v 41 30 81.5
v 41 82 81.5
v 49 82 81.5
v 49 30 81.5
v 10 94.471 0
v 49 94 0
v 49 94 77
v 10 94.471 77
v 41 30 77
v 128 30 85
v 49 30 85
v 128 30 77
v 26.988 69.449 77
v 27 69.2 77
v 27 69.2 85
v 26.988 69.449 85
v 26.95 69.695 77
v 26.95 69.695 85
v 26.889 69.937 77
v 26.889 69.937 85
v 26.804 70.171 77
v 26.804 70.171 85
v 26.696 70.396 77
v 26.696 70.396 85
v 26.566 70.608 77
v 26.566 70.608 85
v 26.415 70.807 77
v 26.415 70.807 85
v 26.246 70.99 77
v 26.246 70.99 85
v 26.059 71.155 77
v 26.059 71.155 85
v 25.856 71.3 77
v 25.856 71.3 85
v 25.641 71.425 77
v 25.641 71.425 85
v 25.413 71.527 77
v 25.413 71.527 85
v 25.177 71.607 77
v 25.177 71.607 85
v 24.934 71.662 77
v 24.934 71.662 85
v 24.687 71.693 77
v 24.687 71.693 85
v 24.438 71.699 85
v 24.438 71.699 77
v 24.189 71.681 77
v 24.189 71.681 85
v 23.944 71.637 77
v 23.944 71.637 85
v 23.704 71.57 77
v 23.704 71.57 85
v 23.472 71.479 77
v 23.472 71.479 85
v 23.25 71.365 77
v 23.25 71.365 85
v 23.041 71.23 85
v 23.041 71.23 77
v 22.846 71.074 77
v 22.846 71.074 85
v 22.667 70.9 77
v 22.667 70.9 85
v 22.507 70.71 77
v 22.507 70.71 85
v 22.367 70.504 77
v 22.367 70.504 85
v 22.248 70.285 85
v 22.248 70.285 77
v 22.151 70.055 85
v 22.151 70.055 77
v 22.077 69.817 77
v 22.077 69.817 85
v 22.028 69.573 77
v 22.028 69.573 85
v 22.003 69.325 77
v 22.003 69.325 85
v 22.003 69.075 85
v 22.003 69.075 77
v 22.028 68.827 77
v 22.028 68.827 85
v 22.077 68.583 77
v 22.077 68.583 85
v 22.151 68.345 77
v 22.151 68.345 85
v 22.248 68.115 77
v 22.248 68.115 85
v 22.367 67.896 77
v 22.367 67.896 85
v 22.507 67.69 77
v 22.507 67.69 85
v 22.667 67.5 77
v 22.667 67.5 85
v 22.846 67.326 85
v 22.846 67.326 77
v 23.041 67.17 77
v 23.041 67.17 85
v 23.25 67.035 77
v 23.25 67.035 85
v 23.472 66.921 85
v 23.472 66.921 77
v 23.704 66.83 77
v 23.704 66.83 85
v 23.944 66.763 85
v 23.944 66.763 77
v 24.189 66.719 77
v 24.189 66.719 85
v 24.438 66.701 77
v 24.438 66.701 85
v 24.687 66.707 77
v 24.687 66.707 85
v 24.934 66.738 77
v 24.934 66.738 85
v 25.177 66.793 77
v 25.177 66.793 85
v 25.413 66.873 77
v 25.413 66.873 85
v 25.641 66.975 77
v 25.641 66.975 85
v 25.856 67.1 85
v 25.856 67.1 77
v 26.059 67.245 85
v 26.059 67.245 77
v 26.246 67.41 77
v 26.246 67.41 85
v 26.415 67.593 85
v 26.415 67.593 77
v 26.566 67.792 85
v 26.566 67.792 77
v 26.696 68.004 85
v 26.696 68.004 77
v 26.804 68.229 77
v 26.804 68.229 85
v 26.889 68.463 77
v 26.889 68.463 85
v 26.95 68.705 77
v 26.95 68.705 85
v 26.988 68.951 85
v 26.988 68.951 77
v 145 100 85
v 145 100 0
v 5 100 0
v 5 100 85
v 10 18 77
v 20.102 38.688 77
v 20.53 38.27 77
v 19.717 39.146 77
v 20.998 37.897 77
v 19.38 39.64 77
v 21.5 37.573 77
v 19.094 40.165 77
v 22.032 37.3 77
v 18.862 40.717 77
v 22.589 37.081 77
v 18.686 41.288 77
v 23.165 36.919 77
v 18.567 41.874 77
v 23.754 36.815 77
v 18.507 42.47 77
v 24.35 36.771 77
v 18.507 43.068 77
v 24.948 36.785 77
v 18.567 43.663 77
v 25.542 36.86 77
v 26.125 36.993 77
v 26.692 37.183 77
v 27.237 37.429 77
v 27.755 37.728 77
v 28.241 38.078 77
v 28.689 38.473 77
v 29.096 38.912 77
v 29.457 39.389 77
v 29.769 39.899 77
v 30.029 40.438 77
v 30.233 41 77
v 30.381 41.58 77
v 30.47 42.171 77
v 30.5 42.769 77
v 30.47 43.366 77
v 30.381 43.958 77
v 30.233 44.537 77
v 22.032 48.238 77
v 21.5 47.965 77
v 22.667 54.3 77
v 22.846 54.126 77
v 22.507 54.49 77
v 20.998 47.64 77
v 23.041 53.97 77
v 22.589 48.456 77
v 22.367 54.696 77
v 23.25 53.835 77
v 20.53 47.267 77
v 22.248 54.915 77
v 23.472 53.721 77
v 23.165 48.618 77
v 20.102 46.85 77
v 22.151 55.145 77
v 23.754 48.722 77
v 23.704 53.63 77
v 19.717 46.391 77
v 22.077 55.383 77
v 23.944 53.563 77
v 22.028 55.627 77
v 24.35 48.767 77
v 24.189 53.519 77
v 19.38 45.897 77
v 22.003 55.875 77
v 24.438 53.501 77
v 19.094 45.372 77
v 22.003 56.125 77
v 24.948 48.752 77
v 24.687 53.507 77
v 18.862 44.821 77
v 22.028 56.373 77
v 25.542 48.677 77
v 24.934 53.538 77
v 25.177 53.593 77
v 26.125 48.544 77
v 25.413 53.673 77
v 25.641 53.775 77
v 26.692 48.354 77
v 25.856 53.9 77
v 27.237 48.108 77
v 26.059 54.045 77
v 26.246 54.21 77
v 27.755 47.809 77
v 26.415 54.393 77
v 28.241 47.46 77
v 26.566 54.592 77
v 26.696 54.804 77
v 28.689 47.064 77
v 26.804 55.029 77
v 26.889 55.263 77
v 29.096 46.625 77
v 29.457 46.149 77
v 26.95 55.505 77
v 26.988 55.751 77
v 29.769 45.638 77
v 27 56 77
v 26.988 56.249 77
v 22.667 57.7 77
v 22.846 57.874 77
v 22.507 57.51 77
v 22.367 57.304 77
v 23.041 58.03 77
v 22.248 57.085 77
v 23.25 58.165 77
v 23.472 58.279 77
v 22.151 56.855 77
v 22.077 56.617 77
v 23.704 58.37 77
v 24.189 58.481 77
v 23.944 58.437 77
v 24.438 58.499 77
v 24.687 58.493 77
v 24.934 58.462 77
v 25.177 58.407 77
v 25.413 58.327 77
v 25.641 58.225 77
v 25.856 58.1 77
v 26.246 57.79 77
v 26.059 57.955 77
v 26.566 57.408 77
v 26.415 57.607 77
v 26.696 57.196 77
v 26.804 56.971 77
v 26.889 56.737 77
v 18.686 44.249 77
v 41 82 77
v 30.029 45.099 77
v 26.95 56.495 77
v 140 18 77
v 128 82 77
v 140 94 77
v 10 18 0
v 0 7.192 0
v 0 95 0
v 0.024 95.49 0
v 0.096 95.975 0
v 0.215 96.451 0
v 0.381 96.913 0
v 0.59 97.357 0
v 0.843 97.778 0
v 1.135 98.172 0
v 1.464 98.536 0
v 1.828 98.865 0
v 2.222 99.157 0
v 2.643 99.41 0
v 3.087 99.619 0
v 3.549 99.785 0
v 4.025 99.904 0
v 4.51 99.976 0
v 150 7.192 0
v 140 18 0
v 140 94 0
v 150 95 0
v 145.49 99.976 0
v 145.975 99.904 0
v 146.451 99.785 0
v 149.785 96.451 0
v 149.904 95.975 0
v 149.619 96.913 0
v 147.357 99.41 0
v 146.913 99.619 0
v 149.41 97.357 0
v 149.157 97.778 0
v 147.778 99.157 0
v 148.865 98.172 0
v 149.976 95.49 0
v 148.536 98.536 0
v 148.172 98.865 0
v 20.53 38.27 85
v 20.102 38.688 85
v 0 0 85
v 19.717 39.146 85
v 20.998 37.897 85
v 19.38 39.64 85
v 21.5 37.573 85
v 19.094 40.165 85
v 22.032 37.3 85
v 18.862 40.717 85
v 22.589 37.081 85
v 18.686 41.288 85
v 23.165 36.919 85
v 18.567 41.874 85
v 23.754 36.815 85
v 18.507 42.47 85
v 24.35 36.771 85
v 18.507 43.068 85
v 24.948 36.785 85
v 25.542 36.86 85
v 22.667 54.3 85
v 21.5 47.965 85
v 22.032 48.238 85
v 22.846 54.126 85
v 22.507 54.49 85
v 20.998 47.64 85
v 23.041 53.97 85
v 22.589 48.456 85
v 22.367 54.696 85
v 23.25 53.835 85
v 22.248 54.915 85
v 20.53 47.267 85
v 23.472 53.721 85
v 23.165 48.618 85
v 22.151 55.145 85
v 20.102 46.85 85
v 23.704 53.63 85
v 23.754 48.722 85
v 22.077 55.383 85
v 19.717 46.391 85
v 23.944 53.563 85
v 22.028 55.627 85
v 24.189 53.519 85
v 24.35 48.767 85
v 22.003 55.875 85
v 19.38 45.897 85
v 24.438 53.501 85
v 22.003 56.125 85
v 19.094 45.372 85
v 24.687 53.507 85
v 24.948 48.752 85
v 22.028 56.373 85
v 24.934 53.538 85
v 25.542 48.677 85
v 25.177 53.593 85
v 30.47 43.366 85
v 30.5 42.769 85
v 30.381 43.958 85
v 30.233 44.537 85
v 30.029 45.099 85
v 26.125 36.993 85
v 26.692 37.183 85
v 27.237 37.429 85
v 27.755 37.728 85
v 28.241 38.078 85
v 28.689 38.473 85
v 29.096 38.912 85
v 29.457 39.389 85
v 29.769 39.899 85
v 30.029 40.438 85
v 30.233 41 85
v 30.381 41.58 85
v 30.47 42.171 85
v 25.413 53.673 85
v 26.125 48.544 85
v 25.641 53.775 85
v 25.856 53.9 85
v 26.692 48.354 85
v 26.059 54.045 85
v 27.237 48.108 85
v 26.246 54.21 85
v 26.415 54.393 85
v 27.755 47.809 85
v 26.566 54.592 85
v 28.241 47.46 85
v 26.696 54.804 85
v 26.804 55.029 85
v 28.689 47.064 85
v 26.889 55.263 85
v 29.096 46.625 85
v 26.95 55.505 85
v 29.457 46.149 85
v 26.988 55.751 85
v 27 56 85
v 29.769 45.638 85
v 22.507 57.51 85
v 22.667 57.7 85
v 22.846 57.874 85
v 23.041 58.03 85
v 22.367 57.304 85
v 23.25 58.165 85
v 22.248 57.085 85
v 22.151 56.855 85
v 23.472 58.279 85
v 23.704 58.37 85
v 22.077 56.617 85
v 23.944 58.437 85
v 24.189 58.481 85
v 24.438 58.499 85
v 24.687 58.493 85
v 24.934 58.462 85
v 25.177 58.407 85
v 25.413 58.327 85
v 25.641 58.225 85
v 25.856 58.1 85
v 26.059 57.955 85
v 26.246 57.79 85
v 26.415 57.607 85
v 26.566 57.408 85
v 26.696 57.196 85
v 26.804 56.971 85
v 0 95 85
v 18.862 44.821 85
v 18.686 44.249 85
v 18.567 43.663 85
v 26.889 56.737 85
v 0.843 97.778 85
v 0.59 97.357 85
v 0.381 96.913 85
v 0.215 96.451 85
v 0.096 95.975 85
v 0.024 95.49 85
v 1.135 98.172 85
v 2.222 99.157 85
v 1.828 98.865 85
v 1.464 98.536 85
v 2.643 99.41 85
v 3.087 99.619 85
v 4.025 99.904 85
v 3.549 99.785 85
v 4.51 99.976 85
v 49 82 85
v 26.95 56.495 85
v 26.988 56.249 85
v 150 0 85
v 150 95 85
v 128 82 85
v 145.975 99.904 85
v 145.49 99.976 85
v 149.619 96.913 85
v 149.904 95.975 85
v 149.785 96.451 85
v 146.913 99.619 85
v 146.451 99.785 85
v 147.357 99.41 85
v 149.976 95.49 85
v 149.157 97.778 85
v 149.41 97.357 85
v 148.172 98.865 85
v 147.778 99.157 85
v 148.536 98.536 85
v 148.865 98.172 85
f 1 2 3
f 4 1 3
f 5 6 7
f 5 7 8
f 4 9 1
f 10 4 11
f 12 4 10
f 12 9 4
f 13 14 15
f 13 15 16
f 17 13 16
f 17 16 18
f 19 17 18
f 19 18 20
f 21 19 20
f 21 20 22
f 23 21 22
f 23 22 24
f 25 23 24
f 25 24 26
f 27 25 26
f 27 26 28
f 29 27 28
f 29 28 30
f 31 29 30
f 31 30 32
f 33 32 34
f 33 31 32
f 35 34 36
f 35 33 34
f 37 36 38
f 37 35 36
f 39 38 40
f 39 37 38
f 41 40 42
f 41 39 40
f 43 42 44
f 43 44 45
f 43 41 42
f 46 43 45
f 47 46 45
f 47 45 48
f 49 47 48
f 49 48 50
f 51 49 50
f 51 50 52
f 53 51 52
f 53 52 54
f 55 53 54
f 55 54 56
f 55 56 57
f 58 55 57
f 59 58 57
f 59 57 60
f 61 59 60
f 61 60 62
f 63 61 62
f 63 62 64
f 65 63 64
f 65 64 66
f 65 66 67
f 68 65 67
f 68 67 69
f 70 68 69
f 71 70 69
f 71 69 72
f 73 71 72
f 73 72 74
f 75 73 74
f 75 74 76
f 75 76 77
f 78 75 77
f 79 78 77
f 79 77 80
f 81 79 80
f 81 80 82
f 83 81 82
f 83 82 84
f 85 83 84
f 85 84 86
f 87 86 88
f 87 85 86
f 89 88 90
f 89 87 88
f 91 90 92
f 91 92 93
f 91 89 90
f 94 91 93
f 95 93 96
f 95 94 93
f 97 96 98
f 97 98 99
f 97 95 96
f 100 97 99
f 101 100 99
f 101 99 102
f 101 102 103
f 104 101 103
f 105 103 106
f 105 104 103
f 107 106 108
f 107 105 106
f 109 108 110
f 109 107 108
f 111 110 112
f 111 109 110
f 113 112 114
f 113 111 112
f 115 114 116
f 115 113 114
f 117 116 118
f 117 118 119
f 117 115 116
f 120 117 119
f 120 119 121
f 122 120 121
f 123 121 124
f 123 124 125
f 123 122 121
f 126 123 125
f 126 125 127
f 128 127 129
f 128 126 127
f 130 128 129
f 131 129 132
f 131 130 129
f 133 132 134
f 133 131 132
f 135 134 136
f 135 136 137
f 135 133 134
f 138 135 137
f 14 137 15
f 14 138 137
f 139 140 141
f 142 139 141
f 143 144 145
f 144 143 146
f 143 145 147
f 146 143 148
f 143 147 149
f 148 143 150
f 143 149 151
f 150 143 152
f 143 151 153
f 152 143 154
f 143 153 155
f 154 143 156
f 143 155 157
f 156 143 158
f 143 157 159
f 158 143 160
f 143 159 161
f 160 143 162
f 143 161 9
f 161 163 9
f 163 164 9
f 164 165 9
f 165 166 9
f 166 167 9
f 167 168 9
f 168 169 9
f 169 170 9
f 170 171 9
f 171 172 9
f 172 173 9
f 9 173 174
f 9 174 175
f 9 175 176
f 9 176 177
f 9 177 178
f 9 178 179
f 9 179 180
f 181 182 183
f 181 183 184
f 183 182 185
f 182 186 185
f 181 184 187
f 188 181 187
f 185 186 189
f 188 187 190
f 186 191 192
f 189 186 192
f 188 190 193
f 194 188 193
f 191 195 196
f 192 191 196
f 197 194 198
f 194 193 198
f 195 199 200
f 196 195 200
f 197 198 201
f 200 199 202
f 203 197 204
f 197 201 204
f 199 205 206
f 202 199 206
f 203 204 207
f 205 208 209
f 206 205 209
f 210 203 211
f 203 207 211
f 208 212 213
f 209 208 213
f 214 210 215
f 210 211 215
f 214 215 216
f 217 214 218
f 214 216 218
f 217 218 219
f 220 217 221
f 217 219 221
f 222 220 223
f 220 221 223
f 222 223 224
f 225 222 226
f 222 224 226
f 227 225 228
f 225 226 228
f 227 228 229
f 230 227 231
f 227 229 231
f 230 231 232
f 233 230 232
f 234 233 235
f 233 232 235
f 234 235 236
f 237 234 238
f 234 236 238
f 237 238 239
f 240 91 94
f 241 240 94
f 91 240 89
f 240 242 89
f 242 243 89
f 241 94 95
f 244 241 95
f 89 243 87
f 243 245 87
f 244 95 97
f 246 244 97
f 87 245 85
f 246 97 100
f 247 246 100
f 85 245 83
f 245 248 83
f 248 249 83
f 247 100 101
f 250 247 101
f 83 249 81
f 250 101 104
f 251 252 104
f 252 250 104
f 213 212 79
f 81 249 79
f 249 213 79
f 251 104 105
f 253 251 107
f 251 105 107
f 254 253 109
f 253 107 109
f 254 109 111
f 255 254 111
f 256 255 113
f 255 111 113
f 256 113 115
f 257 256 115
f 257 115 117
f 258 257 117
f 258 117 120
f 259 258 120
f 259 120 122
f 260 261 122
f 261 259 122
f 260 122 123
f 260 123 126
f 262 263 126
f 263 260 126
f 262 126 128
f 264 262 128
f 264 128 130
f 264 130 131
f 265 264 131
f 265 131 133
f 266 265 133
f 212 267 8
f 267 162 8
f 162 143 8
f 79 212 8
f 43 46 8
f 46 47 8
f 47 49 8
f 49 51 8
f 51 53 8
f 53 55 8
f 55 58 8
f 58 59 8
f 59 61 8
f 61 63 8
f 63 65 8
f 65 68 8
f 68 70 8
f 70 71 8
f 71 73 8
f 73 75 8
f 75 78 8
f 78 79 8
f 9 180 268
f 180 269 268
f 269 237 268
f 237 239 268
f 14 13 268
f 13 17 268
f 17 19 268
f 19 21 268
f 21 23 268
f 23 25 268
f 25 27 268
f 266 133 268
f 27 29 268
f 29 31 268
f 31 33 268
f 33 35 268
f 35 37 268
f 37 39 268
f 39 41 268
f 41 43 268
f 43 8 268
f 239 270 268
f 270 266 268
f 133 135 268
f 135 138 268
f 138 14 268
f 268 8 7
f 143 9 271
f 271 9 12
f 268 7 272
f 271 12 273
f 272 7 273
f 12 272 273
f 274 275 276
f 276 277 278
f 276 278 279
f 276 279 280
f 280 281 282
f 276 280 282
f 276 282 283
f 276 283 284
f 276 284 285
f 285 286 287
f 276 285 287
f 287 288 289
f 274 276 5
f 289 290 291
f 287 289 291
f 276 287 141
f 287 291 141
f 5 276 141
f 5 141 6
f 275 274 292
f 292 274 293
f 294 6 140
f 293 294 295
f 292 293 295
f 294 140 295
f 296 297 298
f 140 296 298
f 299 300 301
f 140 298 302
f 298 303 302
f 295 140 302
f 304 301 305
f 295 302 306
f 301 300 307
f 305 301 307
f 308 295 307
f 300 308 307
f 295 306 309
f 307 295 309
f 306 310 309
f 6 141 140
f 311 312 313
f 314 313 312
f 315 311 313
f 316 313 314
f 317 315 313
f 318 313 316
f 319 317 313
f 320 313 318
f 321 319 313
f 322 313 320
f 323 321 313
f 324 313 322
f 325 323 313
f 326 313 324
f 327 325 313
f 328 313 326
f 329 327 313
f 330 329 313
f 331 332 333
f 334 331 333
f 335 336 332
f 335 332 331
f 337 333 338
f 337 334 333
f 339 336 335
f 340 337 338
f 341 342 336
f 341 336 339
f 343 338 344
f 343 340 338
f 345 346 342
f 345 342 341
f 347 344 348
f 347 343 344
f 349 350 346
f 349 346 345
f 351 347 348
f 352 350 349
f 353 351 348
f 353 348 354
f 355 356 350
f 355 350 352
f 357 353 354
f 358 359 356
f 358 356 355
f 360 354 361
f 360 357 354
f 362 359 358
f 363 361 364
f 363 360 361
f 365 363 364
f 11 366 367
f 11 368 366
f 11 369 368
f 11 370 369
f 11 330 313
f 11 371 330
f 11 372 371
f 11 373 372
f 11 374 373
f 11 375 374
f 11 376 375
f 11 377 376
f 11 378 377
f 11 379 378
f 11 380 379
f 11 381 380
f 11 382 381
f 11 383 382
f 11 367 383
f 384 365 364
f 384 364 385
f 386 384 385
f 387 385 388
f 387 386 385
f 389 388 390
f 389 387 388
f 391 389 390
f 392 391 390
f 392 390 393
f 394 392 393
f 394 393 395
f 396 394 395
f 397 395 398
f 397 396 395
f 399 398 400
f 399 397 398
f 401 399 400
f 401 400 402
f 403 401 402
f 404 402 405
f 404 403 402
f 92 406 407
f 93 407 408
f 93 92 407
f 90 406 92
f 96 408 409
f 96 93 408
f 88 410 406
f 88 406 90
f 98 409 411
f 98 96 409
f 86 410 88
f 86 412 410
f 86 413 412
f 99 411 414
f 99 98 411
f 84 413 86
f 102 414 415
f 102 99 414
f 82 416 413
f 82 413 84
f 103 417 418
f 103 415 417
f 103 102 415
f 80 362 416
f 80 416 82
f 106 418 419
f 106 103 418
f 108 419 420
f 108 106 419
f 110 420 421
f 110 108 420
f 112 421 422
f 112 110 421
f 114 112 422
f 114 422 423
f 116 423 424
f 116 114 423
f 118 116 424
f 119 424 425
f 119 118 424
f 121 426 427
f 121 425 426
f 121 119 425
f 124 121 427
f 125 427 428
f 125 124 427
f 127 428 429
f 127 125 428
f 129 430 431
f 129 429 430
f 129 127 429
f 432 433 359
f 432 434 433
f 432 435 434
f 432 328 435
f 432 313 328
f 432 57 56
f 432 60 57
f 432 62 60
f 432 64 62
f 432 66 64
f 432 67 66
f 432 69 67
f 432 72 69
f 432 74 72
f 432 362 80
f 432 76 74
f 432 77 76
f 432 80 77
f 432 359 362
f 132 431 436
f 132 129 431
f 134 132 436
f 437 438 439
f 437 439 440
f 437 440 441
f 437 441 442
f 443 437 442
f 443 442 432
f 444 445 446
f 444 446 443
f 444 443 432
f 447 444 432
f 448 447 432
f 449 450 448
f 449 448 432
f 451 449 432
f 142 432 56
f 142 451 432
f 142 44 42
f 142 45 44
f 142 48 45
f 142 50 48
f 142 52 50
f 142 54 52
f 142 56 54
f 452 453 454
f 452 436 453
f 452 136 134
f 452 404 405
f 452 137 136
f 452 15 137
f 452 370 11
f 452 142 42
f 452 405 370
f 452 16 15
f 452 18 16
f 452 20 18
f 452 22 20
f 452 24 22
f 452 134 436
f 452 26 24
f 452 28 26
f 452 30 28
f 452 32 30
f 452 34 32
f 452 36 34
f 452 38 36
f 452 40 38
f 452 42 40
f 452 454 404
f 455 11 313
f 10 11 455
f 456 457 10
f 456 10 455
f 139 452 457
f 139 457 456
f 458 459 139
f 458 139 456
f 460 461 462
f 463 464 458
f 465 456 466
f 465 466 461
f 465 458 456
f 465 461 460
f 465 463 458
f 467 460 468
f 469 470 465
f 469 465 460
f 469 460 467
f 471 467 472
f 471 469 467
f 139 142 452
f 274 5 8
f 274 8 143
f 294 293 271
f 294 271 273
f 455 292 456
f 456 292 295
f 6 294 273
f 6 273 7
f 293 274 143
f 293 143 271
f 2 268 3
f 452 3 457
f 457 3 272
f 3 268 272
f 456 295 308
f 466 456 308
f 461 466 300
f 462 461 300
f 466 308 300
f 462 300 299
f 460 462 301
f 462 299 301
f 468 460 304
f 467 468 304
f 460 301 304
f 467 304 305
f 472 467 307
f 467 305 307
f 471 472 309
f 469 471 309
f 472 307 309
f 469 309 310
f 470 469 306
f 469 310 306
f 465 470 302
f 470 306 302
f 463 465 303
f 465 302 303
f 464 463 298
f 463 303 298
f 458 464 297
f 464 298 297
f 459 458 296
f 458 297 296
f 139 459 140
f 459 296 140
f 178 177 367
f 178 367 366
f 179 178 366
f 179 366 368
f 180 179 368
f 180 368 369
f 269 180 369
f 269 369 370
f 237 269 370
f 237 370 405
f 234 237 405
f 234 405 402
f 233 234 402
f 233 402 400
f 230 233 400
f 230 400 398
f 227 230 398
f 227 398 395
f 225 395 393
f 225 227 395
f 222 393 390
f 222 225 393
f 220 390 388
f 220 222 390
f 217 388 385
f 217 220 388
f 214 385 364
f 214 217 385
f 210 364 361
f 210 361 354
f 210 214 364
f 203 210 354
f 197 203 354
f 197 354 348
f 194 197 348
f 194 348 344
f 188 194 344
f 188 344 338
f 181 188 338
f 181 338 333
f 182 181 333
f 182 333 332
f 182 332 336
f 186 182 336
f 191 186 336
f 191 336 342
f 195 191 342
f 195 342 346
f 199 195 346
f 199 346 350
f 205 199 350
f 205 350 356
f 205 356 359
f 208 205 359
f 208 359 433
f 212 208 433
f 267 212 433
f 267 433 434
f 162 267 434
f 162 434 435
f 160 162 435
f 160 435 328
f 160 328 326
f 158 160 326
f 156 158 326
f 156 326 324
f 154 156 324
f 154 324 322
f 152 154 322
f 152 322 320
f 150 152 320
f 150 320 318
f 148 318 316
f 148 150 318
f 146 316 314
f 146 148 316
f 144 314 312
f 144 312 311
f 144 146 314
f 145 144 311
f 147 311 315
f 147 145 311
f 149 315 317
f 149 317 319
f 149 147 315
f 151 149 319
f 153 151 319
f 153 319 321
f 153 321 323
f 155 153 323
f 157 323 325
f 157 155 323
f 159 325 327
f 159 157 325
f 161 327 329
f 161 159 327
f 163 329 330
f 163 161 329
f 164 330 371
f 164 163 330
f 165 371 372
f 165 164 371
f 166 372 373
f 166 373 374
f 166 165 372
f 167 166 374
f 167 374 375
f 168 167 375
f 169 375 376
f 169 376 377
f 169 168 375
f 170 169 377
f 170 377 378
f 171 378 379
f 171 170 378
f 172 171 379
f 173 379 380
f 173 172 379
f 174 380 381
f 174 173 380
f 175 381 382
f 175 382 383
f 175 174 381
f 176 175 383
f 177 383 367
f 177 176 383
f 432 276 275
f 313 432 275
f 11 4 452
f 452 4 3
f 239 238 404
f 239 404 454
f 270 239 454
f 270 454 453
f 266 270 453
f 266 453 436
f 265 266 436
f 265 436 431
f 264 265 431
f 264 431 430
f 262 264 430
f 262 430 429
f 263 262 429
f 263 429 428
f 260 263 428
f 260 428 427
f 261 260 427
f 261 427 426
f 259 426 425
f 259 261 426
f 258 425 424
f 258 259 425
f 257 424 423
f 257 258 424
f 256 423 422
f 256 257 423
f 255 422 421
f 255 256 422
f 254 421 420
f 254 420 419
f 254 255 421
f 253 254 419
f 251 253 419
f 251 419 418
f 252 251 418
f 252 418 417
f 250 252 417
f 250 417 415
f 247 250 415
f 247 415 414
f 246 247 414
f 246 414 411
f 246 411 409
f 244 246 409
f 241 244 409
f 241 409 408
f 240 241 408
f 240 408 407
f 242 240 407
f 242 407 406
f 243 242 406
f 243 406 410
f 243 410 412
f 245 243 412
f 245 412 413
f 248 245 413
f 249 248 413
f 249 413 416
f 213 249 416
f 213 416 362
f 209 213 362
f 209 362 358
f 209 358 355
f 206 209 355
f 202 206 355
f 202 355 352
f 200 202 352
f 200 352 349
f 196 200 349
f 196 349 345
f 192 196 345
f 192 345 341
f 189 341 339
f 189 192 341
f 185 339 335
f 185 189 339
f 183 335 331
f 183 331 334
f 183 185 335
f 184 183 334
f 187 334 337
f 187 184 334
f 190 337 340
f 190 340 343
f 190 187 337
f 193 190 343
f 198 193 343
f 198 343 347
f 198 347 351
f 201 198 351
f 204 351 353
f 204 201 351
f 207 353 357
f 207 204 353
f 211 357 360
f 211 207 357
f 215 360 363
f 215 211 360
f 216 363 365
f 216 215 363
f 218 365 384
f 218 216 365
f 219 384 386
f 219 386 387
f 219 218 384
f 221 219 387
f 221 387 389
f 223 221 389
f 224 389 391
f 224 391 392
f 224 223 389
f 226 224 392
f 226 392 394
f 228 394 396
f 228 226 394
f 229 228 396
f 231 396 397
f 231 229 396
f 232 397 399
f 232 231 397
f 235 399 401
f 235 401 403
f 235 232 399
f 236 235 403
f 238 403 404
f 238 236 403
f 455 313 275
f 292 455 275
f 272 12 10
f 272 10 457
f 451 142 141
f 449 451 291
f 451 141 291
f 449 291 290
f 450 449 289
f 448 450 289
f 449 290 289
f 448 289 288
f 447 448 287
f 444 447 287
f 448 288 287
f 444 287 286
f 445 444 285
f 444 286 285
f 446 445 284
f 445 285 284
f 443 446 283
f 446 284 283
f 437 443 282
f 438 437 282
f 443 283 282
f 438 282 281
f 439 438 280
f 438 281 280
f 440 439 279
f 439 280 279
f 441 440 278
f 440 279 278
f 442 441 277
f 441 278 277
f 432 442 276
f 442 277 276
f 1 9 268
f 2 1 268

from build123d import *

# Parameters (mm, degrees)
F0_R     = 6
F0_R_2   = 2.5
F0_W     = 79
F0_H     = 52
F1_DEPTH = 85
F2_DEPTH = 77
F3_W     = 8
F3_H     = 52
F4_DEPTH = 81.5
F6_DEPTH = 150


with BuildPart() as f1:
    # F0 (on Top) → F1 (new body)
    with BuildSketch(Plane.XY):
        with BuildLine():
            Line((0, 95), (0, 0))
            Line((0, 0), (150, 0))
            Line((150, 0), (150, 95))
            ThreePointArc((150, 95), (148.535534, 98.535534), (145, 100))
            Line((145, 100), (5, 100))
            ThreePointArc((5, 100), (1.464466, 98.535534), (0, 95))
        make_face()
        Polygon((140, 94), (140, 18), (49, 18), (10, 18), (10, 94.470508), (49, 94), align=None, mode=Mode.SUBTRACT)
        Polygon((49, 18), (140, 18), (140, 94), (49, 94), (10, 94.470508), (10, 18), align=None)
        with Locations((24.5, 42.768653)):
            Circle(F0_R, mode=Mode.SUBTRACT)
        with Locations((24.5, 56)):
            Circle(F0_R_2, mode=Mode.SUBTRACT)
        with Locations((24.5, 69.2)):
            Circle(F0_R_2, mode=Mode.SUBTRACT)
        with Locations((88.5, 56)):
            Rectangle(F0_W, F0_H, mode=Mode.SUBTRACT)
    extrude(amount=F1_DEPTH)

    # F0 (on Top) → F2 (cut)
    with BuildSketch(Plane.XY):
        Polygon((49, 18), (140, 18), (140, 94), (49, 94), (10, 94.470508), (10, 18), align=None)
        with Locations((24.5, 42.768653)):
            Circle(F0_R, mode=Mode.SUBTRACT)
        with Locations((24.5, 56)):
            Circle(F0_R_2, mode=Mode.SUBTRACT)
        with Locations((24.5, 69.2)):
            Circle(F0_R_2, mode=Mode.SUBTRACT)
        with Locations((88.5, 56)):
            Rectangle(F0_W, F0_H, mode=Mode.SUBTRACT)
    extrude(amount=F2_DEPTH, mode=Mode.SUBTRACT)

    # F3 (on face) → F4 (cut)
    with BuildSketch(Plane.XY):
        with Locations((45, 56)):
            Rectangle(F3_W, F3_H)
    extrude(amount=F4_DEPTH, mode=Mode.SUBTRACT)

    # F5 (on face) → F6 (cut, through all)
    with BuildSketch(Plane(origin=(0, 0, 0), x_dir=(0, -1, 0), z_dir=(-1, 0, 0))):
        Polygon((0, 0), (0, 85), (-7.192497, 0), align=None)
    extrude(amount=-F6_DEPTH, mode=Mode.SUBTRACT)


solid = f1.part
